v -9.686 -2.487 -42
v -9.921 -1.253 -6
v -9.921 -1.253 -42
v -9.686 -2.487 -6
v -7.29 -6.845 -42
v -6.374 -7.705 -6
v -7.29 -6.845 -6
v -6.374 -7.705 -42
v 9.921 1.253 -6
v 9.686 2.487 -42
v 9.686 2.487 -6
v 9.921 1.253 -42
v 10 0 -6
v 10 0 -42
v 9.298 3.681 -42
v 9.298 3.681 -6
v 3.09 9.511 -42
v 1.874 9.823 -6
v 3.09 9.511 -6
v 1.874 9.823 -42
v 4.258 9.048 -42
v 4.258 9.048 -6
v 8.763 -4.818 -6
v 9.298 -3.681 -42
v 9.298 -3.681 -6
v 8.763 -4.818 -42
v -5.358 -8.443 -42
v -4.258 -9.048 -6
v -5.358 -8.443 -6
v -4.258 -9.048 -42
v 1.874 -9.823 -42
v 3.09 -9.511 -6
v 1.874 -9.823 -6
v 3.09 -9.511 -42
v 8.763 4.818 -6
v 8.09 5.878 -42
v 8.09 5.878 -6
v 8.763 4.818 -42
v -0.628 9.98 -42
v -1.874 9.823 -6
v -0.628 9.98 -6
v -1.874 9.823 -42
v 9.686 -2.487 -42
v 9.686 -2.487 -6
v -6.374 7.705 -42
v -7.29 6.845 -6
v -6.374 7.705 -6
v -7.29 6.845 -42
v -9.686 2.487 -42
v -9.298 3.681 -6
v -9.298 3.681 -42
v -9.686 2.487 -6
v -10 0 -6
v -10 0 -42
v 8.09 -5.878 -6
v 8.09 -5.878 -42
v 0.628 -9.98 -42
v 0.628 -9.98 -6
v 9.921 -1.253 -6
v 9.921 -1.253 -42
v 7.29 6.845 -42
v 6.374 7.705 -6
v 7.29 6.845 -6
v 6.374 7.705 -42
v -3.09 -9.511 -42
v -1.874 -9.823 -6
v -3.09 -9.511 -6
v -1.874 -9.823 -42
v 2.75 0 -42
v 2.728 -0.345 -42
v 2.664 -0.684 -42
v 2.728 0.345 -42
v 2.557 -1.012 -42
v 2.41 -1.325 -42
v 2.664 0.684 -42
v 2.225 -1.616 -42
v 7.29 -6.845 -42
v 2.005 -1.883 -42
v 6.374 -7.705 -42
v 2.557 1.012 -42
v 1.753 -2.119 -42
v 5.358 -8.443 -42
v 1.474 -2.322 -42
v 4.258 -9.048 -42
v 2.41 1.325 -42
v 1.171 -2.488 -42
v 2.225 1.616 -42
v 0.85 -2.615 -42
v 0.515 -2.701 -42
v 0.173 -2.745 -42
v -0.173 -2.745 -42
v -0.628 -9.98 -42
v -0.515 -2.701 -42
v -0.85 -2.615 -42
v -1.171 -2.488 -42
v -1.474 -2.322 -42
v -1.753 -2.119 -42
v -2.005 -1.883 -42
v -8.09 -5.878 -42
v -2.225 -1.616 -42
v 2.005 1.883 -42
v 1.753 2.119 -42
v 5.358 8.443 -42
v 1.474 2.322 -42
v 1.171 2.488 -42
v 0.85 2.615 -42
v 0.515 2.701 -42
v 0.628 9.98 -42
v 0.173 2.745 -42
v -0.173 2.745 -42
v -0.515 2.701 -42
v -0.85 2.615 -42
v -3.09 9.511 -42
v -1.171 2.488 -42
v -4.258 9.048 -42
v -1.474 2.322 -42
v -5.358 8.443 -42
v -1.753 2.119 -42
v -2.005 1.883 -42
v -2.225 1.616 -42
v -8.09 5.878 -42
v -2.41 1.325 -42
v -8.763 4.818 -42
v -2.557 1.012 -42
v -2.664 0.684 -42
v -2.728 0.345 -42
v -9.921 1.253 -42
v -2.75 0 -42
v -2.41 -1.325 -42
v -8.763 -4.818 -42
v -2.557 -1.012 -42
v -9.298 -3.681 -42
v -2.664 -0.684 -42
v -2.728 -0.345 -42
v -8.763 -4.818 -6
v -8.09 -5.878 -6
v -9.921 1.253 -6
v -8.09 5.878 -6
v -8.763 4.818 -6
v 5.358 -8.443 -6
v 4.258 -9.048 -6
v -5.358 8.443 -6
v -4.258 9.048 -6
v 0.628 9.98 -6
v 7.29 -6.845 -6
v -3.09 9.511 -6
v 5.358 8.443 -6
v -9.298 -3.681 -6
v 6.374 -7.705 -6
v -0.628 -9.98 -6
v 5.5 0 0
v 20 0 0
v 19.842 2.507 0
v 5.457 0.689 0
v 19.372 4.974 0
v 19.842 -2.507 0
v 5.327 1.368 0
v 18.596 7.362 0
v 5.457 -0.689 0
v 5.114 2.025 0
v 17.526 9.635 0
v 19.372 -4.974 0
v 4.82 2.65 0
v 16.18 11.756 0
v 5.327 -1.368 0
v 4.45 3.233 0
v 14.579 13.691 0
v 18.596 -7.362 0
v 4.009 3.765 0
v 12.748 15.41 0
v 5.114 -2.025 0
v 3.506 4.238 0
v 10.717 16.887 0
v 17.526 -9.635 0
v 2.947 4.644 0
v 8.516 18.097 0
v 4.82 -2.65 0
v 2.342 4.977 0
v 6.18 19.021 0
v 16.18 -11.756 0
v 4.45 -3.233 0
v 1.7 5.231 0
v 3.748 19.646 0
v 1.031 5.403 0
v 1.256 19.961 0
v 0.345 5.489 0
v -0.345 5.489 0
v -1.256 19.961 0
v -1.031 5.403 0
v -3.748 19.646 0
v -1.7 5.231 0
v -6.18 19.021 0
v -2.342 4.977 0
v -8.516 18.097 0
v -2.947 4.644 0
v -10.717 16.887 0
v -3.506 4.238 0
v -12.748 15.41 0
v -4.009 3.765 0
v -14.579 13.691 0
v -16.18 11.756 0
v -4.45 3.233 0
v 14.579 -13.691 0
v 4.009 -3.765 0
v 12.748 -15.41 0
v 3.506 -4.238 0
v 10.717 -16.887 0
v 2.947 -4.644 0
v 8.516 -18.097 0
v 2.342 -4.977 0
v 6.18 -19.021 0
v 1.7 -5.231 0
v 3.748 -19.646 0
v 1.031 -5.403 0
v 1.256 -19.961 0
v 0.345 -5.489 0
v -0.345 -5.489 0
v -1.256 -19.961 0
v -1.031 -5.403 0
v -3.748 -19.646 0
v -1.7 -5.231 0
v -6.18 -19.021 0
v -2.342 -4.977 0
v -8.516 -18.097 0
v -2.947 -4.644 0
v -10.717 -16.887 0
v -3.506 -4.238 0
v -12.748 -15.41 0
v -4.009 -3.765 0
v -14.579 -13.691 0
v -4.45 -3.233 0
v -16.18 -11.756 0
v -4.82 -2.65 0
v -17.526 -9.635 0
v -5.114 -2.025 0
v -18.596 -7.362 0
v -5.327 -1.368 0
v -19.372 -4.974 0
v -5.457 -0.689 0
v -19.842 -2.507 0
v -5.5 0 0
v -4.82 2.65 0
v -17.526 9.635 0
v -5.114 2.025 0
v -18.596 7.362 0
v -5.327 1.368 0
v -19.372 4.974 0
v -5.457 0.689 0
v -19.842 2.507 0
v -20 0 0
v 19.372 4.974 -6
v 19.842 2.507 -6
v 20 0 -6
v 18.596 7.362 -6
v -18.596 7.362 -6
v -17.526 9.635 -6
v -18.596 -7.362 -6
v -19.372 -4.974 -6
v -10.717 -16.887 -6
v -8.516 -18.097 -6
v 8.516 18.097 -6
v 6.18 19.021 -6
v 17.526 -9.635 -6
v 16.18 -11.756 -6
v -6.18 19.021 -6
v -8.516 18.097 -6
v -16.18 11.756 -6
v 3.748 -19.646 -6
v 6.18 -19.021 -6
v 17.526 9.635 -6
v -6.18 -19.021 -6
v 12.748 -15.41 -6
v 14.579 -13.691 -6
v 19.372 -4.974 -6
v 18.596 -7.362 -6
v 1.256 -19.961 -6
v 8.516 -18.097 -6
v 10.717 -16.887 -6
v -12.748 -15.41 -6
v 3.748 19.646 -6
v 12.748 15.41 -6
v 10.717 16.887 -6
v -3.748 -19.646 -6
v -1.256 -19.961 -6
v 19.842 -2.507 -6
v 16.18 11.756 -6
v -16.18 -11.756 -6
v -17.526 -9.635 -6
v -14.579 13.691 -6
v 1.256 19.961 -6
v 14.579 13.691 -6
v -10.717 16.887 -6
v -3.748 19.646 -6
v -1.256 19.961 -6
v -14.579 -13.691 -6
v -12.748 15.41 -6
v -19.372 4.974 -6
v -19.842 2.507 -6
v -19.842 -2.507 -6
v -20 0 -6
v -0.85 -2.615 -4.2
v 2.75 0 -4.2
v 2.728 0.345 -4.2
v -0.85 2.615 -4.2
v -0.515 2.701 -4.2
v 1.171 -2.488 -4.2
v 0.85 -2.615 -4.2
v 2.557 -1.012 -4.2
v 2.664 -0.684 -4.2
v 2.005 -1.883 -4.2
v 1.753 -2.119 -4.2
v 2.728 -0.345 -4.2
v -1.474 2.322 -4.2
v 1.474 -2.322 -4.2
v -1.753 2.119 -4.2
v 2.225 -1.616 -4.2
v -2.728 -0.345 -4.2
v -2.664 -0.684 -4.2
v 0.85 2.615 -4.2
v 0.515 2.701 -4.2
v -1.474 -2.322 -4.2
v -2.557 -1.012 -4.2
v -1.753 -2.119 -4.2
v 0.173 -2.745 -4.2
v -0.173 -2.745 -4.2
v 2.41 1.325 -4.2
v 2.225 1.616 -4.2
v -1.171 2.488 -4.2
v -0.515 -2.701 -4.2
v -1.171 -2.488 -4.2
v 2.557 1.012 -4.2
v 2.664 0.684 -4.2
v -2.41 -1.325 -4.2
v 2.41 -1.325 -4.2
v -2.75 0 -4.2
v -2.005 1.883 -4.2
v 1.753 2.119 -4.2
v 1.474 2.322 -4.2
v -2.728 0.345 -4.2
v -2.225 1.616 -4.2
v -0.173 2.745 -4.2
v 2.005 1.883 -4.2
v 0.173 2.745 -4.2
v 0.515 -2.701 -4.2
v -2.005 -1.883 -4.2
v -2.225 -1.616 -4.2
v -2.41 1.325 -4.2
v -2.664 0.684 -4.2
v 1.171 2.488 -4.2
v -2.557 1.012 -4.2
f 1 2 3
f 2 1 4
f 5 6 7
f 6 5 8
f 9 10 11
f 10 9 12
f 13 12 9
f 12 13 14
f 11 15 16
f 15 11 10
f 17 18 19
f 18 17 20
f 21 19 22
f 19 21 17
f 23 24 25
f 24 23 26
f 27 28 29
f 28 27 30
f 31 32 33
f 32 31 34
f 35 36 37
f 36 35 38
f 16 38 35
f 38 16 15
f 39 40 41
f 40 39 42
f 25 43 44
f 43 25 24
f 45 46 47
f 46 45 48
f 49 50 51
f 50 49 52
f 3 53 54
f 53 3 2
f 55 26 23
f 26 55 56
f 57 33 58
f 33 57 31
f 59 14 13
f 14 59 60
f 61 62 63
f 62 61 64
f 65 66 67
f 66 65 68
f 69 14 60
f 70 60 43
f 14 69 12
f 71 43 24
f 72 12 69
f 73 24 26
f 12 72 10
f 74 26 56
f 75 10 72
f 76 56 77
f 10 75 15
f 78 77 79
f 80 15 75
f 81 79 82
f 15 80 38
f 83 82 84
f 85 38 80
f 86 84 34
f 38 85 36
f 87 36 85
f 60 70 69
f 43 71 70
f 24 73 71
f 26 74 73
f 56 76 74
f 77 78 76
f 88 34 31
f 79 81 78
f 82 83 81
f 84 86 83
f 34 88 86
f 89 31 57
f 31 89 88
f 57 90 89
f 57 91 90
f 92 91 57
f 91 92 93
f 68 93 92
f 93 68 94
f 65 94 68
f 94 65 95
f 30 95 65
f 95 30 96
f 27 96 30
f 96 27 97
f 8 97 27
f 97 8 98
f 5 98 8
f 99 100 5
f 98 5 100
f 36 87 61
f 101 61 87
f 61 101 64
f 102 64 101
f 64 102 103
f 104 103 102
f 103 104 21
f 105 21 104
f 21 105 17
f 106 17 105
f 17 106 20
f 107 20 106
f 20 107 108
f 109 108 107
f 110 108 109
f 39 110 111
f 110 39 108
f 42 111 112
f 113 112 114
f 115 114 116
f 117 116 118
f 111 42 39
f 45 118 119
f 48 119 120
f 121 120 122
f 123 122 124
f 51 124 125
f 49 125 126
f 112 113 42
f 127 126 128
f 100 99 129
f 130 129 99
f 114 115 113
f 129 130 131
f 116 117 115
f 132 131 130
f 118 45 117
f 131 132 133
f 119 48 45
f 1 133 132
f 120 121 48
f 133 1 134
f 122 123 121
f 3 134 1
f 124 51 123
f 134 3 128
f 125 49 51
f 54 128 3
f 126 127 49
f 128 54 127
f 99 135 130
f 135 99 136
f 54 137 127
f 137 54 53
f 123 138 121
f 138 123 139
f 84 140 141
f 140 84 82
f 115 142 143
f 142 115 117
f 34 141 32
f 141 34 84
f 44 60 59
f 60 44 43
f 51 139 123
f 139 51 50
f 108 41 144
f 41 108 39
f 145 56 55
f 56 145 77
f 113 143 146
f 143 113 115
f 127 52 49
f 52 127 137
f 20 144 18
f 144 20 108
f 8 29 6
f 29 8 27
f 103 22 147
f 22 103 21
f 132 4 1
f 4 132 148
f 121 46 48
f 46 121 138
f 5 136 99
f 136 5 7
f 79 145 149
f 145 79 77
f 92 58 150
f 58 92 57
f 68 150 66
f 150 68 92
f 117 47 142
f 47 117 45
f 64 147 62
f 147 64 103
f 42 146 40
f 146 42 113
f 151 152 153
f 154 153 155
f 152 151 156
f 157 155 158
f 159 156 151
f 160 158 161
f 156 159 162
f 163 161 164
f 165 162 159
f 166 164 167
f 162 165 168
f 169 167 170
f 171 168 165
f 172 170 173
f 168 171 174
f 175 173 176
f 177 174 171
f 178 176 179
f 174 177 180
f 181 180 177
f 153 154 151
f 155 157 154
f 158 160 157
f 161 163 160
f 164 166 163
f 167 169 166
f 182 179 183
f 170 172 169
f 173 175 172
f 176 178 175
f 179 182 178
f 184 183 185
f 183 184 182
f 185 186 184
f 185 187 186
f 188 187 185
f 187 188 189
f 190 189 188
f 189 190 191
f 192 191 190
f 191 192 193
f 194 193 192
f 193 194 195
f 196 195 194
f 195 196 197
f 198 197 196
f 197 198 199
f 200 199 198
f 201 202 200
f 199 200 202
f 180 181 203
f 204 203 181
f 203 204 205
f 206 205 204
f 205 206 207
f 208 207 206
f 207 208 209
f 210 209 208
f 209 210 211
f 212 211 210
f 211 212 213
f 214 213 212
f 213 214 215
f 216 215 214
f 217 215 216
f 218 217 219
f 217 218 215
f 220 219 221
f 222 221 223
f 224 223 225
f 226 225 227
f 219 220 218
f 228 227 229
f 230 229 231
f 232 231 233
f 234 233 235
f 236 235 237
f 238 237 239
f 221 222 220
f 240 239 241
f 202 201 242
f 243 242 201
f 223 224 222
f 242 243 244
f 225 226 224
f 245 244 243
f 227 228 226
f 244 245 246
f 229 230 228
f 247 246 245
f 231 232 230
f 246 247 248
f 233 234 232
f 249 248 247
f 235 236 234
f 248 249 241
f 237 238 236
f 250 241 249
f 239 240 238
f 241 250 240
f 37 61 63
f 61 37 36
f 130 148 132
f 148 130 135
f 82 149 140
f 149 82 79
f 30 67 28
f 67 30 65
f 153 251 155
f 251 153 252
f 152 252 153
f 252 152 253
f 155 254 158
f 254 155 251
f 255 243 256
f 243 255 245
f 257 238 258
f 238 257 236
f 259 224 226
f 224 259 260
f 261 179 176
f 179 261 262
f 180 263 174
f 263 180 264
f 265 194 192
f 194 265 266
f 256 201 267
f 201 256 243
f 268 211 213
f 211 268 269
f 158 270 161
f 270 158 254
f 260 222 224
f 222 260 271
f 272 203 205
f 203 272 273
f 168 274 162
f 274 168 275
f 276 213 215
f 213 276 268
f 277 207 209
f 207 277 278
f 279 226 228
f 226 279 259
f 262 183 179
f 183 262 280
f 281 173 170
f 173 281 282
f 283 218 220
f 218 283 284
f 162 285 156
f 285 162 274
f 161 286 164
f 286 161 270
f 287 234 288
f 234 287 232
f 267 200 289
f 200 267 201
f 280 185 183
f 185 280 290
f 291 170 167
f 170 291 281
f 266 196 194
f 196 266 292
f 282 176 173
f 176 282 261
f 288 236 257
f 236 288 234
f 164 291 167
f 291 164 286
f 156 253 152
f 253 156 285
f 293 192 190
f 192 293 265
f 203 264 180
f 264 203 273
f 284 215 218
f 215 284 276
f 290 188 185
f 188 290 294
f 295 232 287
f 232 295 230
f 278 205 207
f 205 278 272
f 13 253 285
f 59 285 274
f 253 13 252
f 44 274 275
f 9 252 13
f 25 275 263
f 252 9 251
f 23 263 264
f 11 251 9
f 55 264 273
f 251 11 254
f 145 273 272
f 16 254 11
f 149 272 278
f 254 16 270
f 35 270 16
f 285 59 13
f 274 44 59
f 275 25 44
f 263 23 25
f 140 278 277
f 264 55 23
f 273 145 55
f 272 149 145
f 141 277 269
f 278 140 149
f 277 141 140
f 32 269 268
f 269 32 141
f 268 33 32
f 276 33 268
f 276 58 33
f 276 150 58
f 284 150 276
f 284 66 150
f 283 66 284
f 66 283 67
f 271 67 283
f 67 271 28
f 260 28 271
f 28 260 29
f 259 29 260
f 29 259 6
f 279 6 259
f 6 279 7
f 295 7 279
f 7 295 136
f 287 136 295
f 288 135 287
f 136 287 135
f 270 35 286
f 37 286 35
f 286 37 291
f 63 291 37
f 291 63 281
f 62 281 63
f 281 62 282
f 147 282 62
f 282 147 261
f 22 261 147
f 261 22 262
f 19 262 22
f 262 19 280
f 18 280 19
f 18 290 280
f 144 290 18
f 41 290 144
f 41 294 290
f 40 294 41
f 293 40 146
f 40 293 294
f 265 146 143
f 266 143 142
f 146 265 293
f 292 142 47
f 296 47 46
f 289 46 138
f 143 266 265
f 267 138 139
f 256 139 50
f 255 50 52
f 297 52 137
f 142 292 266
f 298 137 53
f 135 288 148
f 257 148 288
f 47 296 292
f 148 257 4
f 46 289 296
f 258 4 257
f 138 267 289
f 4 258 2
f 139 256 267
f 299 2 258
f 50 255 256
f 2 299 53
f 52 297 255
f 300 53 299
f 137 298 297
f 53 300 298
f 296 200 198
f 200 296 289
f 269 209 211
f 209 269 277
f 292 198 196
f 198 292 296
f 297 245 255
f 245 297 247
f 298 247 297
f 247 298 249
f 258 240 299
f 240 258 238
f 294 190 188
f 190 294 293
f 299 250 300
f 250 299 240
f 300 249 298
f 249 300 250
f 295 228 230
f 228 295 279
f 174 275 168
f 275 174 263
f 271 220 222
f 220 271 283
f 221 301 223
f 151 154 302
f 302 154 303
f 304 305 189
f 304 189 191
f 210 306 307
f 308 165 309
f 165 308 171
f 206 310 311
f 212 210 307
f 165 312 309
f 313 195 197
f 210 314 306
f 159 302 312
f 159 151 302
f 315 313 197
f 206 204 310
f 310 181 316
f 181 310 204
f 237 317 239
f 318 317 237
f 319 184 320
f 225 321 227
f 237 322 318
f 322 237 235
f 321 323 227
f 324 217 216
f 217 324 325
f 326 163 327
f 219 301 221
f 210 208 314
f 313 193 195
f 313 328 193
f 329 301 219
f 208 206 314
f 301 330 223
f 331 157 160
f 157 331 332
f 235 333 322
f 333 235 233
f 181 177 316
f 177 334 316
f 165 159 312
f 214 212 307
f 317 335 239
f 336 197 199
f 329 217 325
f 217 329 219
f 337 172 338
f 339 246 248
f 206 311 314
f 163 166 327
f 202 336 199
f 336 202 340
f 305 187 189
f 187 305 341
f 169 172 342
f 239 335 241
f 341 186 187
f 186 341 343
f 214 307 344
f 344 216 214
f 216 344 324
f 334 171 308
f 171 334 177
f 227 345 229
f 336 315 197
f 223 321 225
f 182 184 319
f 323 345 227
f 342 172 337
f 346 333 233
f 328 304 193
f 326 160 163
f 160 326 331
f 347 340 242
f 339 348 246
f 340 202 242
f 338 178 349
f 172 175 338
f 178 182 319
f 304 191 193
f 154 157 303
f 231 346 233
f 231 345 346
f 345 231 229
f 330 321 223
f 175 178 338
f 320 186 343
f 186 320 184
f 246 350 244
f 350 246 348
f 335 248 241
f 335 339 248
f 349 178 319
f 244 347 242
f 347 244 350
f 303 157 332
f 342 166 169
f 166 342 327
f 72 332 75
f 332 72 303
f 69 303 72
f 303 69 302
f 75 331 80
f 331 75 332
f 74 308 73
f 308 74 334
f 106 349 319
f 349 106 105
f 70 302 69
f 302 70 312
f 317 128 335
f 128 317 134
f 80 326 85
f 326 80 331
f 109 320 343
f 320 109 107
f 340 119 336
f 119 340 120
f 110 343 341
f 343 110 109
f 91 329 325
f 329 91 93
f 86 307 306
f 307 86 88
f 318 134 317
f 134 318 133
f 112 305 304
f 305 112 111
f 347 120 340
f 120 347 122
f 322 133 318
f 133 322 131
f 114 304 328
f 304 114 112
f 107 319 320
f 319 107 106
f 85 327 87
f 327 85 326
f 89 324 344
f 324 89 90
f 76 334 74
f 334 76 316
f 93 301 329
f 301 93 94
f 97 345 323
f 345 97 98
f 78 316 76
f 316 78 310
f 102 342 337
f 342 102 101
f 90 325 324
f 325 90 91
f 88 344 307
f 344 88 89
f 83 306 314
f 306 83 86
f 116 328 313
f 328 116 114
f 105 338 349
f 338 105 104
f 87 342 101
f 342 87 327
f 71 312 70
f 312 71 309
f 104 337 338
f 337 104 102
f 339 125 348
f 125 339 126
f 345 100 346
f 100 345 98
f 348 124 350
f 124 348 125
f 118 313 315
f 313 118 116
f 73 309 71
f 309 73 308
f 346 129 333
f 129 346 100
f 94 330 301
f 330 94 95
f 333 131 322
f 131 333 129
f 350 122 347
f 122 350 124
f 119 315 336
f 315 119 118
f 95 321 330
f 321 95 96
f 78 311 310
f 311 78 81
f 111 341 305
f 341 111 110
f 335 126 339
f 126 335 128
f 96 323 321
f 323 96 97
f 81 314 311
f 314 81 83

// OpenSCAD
$fn = 50;


difference() {
	union() {
		translate(v = [0, 0, -42.0000000000]) {
			cylinder(h = 42, r = 10.0000000000);
		}
		translate(v = [0, 0, -6.0000000000]) {
			cylinder(h = 6, r = 20.0000000000);
		}
	}
	union() {
		translate(v = [0, 0, 0]) {
			rotate(a = [0, 0, 0]) {
				difference() {
					union() {
						#translate(v = [0, 0, -42.0000000000]) {
							cylinder(h = 42, r = 2.2500000000);
						}
						#translate(v = [0, 0, -4.2000000000]) {
							cylinder(h = 4.2000000000, r1 = 2.7500000000, r2 = 5.5000000000);
						}
						#translate(v = [0, 0, -42.0000000000]) {
							cylinder(h = 42, r = 2.7500000000);
						}
						#translate(v = [0, 0, -42.0000000000]) {
							cylinder(h = 42, r = 2.2500000000);
						}
					}
					union();
				}
			}
		}
	}
}
